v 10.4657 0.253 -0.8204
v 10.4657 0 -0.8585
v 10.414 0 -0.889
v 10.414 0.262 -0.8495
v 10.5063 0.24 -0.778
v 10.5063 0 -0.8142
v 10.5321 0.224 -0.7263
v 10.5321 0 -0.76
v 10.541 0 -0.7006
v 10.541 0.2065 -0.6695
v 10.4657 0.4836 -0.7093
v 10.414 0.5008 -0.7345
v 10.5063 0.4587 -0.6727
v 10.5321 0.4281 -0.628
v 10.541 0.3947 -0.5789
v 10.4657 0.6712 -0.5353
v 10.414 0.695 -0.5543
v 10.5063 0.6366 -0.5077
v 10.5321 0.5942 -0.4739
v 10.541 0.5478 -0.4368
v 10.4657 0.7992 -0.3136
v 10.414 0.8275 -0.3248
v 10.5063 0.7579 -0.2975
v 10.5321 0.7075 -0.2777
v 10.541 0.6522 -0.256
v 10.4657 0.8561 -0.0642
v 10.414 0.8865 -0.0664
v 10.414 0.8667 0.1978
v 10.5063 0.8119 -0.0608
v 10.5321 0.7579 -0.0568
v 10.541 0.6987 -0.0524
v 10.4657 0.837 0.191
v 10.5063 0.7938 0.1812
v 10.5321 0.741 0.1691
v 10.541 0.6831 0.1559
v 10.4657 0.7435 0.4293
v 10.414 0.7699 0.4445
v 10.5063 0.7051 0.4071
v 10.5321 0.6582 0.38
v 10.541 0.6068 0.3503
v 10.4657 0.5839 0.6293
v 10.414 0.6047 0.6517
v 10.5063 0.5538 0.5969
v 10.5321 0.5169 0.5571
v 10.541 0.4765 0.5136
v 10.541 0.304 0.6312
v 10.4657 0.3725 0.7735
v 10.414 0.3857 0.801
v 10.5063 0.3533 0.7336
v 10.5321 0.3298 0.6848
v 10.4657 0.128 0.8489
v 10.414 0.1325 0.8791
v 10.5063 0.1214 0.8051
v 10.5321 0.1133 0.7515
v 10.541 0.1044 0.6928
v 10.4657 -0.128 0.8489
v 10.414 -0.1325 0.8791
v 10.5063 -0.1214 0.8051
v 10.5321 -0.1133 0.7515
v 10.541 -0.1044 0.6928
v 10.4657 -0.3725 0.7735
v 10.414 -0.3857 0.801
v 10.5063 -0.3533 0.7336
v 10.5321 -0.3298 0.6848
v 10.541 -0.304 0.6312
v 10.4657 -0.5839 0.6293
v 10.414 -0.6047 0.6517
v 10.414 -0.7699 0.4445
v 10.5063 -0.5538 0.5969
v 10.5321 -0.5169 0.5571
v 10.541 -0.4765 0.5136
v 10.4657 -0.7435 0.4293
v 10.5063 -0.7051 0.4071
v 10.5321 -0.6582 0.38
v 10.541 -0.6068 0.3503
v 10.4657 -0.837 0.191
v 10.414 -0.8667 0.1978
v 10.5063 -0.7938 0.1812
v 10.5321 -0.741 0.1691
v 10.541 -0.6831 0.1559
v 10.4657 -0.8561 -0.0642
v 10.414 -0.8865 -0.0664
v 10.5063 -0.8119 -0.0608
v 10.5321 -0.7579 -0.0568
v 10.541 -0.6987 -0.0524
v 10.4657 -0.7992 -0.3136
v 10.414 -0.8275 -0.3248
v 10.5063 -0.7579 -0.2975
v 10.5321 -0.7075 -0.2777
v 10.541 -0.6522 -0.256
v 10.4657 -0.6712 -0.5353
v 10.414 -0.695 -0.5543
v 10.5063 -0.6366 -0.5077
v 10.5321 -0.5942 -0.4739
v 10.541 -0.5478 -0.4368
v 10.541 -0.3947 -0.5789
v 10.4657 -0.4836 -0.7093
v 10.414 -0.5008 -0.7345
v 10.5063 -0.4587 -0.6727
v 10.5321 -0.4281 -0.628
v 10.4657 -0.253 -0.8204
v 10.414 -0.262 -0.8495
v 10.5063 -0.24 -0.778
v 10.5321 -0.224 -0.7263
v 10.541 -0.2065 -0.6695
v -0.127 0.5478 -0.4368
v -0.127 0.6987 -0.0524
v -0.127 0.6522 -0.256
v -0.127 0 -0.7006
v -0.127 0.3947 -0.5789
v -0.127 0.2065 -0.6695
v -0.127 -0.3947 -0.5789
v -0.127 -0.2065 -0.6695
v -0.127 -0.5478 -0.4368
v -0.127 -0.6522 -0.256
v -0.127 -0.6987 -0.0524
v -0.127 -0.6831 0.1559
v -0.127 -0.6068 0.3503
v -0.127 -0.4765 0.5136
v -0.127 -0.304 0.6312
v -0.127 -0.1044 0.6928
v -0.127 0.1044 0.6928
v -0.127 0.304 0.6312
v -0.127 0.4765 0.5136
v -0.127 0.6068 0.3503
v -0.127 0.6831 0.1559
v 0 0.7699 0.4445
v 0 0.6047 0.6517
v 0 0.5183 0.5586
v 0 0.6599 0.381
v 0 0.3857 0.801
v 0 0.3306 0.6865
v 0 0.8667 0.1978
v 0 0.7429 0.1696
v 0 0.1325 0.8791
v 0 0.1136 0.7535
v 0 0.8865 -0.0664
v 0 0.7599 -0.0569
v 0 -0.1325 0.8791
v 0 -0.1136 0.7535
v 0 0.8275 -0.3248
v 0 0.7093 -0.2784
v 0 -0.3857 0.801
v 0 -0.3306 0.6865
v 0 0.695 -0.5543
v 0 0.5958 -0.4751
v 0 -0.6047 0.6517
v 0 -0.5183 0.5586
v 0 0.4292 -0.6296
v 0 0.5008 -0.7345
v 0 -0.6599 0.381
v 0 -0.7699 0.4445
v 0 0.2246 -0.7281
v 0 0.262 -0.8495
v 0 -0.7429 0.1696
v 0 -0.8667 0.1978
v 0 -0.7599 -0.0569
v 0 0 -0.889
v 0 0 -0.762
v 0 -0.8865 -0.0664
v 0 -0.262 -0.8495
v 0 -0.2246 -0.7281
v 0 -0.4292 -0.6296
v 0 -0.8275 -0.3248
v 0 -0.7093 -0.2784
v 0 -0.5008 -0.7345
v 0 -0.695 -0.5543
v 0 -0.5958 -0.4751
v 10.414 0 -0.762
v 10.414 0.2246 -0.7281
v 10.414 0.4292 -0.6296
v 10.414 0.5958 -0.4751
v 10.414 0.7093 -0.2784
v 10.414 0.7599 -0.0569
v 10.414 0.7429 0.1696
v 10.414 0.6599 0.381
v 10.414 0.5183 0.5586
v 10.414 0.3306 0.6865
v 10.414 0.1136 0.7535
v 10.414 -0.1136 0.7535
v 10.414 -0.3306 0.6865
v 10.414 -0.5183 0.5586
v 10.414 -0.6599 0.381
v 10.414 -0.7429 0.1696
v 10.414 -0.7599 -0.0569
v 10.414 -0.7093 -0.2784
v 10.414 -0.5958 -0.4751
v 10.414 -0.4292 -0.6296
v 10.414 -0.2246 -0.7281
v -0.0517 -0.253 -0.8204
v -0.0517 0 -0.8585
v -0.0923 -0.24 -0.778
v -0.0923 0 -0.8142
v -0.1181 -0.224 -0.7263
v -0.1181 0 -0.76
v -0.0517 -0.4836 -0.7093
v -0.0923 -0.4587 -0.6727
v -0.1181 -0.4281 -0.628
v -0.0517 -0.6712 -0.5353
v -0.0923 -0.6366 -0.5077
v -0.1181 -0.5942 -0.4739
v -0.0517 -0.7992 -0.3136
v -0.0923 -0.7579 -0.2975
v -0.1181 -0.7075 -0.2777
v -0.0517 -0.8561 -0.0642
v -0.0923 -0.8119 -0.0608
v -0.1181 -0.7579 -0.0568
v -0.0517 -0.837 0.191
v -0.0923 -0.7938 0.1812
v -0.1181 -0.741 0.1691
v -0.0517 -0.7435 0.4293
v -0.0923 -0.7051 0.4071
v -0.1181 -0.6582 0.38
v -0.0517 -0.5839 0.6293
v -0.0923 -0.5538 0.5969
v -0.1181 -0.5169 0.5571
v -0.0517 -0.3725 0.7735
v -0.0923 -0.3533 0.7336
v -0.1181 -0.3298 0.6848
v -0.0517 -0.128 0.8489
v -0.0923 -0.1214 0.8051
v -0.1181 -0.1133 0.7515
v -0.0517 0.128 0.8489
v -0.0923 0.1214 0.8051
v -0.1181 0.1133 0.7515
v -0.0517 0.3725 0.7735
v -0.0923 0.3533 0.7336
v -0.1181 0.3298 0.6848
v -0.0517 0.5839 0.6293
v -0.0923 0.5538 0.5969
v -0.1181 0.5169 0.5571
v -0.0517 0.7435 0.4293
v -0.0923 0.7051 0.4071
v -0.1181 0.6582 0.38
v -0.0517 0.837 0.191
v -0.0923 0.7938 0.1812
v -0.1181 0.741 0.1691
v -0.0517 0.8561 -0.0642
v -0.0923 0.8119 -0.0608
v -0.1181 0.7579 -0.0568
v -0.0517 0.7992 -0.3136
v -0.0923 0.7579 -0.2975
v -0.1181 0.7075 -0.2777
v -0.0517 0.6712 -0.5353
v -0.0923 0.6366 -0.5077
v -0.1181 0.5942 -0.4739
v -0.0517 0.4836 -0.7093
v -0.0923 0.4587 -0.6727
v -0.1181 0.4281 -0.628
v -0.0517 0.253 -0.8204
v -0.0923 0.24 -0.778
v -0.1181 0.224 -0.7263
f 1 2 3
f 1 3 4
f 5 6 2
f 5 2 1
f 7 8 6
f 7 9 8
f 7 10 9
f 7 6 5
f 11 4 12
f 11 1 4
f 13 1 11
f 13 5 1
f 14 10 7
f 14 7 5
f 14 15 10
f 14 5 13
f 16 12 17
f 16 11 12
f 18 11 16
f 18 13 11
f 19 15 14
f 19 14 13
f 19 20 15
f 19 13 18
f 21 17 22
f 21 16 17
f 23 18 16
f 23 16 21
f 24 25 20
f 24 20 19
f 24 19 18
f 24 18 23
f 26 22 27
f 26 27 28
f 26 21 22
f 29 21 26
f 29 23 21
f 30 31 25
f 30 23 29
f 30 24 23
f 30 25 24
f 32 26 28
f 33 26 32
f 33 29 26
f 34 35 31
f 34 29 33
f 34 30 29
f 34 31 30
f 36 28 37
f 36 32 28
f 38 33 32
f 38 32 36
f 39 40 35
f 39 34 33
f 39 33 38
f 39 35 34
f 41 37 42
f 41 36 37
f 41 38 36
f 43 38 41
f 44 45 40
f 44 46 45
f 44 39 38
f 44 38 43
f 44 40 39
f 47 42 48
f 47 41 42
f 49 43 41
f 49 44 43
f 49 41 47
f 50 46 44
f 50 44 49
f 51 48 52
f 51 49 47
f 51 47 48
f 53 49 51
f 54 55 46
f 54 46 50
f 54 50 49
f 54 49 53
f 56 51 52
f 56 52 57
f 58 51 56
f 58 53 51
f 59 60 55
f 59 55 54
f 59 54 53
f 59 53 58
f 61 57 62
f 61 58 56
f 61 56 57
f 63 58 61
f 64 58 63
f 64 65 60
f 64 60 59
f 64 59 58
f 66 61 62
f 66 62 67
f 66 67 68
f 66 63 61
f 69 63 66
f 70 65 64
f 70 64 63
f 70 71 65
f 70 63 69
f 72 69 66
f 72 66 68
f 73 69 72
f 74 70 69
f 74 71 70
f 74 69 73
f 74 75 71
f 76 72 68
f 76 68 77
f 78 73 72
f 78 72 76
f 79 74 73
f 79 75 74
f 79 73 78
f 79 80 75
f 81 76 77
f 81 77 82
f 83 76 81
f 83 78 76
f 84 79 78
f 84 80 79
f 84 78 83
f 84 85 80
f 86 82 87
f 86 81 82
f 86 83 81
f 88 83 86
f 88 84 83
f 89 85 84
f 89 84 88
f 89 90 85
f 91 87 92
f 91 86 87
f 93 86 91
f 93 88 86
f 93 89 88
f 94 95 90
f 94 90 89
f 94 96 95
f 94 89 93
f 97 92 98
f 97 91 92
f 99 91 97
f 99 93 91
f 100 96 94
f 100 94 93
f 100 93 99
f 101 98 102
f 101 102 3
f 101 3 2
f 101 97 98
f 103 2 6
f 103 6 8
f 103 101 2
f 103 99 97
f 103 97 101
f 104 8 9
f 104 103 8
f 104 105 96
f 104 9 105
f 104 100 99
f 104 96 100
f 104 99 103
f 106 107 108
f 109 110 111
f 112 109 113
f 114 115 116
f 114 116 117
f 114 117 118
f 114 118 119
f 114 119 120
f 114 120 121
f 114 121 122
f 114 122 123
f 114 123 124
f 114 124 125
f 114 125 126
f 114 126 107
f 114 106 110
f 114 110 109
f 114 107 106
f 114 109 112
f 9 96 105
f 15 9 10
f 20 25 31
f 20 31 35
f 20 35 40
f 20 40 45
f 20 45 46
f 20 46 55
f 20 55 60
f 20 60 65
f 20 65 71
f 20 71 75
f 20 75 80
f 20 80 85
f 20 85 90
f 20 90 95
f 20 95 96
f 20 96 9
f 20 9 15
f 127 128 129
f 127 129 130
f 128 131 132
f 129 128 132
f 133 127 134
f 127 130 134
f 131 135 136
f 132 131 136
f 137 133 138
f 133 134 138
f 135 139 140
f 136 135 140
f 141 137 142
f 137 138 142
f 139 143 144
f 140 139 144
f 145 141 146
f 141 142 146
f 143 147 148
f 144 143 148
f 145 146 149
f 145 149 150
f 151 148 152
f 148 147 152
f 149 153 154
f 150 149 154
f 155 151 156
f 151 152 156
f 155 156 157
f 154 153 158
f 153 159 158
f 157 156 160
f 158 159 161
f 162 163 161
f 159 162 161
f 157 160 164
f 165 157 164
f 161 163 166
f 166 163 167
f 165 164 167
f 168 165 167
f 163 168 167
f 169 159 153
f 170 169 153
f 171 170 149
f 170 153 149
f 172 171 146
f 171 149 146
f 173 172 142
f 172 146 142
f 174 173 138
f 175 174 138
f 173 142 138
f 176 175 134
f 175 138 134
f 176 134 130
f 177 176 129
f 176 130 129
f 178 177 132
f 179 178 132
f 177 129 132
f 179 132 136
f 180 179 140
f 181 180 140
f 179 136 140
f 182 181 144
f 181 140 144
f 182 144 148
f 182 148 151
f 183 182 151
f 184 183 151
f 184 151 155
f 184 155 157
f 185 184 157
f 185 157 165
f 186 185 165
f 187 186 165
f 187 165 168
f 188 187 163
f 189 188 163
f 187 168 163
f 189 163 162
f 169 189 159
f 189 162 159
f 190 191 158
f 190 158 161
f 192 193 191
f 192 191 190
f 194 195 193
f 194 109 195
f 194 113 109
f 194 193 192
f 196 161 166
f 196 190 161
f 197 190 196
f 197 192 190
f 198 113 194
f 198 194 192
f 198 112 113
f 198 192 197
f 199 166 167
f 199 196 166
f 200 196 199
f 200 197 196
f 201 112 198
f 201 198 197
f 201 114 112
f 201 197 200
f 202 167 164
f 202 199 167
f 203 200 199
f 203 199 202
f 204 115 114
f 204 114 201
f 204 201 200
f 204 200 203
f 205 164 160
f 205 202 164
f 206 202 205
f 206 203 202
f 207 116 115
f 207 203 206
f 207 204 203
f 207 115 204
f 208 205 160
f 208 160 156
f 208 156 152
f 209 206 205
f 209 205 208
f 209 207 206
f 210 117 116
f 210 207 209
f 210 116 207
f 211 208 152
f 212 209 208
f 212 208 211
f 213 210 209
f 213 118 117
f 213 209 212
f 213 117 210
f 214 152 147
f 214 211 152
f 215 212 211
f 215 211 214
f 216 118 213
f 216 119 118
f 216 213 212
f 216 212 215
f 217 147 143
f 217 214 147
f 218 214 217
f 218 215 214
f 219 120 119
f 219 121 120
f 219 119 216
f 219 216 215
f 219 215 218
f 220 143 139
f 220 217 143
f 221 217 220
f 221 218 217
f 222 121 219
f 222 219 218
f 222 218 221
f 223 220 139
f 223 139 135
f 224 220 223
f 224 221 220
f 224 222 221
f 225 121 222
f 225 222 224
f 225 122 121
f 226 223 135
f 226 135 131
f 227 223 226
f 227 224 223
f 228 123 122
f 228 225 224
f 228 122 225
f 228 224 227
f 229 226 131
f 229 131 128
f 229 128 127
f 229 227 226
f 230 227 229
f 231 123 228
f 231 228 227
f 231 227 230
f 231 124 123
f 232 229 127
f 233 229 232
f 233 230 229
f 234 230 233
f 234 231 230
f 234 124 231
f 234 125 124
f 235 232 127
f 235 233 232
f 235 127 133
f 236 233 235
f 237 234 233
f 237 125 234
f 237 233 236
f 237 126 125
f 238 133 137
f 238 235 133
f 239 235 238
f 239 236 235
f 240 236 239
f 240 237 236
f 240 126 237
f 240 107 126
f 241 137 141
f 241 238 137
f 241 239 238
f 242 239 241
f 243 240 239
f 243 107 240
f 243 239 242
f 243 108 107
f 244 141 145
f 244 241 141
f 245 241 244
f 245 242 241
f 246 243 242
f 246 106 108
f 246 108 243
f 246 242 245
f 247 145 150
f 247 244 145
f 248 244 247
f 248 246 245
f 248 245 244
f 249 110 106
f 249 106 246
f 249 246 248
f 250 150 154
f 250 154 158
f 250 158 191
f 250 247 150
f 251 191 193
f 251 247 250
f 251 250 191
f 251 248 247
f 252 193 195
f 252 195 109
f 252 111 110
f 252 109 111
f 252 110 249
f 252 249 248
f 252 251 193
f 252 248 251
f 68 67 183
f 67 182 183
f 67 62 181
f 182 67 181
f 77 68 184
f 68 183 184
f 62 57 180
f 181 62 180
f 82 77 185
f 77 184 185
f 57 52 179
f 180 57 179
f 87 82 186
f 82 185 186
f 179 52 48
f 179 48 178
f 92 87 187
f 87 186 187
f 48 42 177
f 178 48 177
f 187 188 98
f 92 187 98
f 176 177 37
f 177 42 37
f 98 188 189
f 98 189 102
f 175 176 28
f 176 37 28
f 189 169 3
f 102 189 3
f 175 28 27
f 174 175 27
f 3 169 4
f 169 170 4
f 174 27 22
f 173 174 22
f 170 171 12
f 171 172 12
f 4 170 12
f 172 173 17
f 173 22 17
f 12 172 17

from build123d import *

# Parameters (mm, degrees)
SKETCH1_R      = 0.762
EXTRUDE1_DEPTH = 10.414
SKETCH2_R      = 0.889
EXTRUDE2_DEPTH = 0.127
EXTRUDE3_START = 0.127
SKETCH3_R      = 0.889
EXTRUDE3_DEPTH = 0.127
FILLET1_R      = 0.2032


with BuildPart() as part:
    # Sketch1 → Extrude1 (new body)
    with BuildSketch(Plane(origin=(0, 0, 0), x_dir=(0, 0, -1), z_dir=(1, 0, 0))):
        Circle(SKETCH1_R)
    extrude(amount=EXTRUDE1_DEPTH)

    # Sketch2 → Extrude2 (add)
    with BuildSketch(Plane(origin=(10.414, 0, 0), x_dir=(0, 0, -1), z_dir=(1, 0, 0))):
        Circle(SKETCH2_R)
    extrude(amount=EXTRUDE2_DEPTH)

    # Sketch3 → Extrude3 (add)
    with BuildSketch(Plane.ZY.offset(EXTRUDE3_START)):
        with Locations(Location((0, 0, 0), (0, 0, 180))):
            Circle(SKETCH3_R)
    extrude(amount=-EXTRUDE3_DEPTH)

    # Fillet1
    # the kernel refuses this fillet: 0.2032 mm, written as the material it takes off along each edge
    with BuildSketch(Plane(origin=(10.541, 0, 0), x_dir=(0, 0, -1), z_dir=(0, -1, 0))) as fillet1_piece_1:
        with BuildLine():
            CenterArc((0.700628558, -0.2032), FILLET1_R, 22.024312837, 67.975687163)
            Line((0.700628558, 0), (0.700628558, 0.004064))
            Line((0.700628558, 0.004064), (0.889, 0.004064))
            Line((0.889, 0.004064), (0.893064, 0))
            ThreePointArc((0.893064, 0), (0.893064, -0.0635), (0.892767429, -0.125476))
            Line((0.892767429, -0.125476), (0.889, -0.127))
        make_face()
    revolve(axis=Axis((10.541, 0, 0), (1, 0, 0)), mode=Mode.SUBTRACT)
    with BuildSketch(Plane(origin=(-0.127, 0, 0), x_dir=(0, 0, -1), z_dir=(0, 1, 0))) as fillet1_piece_2:
        with BuildLine():
            CenterArc((0.700628558, -0.2032), FILLET1_R, 22.024312837, 67.975687163)
            Line((0.700628558, 0), (0.700628558, 0.004064))
            Line((0.700628558, 0.004064), (0.889, 0.004064))
            Line((0.889, 0.004064), (0.893064, 0))
            ThreePointArc((0.893064, 0), (0.893064, -0.0635), (0.892767429, -0.125476))
            Line((0.892767429, -0.125476), (0.889, -0.127))
        make_face()
    revolve(axis=Axis((-0.127, 0, 0), (-1, 0, 0)), mode=Mode.SUBTRACT)


solid = part.part
